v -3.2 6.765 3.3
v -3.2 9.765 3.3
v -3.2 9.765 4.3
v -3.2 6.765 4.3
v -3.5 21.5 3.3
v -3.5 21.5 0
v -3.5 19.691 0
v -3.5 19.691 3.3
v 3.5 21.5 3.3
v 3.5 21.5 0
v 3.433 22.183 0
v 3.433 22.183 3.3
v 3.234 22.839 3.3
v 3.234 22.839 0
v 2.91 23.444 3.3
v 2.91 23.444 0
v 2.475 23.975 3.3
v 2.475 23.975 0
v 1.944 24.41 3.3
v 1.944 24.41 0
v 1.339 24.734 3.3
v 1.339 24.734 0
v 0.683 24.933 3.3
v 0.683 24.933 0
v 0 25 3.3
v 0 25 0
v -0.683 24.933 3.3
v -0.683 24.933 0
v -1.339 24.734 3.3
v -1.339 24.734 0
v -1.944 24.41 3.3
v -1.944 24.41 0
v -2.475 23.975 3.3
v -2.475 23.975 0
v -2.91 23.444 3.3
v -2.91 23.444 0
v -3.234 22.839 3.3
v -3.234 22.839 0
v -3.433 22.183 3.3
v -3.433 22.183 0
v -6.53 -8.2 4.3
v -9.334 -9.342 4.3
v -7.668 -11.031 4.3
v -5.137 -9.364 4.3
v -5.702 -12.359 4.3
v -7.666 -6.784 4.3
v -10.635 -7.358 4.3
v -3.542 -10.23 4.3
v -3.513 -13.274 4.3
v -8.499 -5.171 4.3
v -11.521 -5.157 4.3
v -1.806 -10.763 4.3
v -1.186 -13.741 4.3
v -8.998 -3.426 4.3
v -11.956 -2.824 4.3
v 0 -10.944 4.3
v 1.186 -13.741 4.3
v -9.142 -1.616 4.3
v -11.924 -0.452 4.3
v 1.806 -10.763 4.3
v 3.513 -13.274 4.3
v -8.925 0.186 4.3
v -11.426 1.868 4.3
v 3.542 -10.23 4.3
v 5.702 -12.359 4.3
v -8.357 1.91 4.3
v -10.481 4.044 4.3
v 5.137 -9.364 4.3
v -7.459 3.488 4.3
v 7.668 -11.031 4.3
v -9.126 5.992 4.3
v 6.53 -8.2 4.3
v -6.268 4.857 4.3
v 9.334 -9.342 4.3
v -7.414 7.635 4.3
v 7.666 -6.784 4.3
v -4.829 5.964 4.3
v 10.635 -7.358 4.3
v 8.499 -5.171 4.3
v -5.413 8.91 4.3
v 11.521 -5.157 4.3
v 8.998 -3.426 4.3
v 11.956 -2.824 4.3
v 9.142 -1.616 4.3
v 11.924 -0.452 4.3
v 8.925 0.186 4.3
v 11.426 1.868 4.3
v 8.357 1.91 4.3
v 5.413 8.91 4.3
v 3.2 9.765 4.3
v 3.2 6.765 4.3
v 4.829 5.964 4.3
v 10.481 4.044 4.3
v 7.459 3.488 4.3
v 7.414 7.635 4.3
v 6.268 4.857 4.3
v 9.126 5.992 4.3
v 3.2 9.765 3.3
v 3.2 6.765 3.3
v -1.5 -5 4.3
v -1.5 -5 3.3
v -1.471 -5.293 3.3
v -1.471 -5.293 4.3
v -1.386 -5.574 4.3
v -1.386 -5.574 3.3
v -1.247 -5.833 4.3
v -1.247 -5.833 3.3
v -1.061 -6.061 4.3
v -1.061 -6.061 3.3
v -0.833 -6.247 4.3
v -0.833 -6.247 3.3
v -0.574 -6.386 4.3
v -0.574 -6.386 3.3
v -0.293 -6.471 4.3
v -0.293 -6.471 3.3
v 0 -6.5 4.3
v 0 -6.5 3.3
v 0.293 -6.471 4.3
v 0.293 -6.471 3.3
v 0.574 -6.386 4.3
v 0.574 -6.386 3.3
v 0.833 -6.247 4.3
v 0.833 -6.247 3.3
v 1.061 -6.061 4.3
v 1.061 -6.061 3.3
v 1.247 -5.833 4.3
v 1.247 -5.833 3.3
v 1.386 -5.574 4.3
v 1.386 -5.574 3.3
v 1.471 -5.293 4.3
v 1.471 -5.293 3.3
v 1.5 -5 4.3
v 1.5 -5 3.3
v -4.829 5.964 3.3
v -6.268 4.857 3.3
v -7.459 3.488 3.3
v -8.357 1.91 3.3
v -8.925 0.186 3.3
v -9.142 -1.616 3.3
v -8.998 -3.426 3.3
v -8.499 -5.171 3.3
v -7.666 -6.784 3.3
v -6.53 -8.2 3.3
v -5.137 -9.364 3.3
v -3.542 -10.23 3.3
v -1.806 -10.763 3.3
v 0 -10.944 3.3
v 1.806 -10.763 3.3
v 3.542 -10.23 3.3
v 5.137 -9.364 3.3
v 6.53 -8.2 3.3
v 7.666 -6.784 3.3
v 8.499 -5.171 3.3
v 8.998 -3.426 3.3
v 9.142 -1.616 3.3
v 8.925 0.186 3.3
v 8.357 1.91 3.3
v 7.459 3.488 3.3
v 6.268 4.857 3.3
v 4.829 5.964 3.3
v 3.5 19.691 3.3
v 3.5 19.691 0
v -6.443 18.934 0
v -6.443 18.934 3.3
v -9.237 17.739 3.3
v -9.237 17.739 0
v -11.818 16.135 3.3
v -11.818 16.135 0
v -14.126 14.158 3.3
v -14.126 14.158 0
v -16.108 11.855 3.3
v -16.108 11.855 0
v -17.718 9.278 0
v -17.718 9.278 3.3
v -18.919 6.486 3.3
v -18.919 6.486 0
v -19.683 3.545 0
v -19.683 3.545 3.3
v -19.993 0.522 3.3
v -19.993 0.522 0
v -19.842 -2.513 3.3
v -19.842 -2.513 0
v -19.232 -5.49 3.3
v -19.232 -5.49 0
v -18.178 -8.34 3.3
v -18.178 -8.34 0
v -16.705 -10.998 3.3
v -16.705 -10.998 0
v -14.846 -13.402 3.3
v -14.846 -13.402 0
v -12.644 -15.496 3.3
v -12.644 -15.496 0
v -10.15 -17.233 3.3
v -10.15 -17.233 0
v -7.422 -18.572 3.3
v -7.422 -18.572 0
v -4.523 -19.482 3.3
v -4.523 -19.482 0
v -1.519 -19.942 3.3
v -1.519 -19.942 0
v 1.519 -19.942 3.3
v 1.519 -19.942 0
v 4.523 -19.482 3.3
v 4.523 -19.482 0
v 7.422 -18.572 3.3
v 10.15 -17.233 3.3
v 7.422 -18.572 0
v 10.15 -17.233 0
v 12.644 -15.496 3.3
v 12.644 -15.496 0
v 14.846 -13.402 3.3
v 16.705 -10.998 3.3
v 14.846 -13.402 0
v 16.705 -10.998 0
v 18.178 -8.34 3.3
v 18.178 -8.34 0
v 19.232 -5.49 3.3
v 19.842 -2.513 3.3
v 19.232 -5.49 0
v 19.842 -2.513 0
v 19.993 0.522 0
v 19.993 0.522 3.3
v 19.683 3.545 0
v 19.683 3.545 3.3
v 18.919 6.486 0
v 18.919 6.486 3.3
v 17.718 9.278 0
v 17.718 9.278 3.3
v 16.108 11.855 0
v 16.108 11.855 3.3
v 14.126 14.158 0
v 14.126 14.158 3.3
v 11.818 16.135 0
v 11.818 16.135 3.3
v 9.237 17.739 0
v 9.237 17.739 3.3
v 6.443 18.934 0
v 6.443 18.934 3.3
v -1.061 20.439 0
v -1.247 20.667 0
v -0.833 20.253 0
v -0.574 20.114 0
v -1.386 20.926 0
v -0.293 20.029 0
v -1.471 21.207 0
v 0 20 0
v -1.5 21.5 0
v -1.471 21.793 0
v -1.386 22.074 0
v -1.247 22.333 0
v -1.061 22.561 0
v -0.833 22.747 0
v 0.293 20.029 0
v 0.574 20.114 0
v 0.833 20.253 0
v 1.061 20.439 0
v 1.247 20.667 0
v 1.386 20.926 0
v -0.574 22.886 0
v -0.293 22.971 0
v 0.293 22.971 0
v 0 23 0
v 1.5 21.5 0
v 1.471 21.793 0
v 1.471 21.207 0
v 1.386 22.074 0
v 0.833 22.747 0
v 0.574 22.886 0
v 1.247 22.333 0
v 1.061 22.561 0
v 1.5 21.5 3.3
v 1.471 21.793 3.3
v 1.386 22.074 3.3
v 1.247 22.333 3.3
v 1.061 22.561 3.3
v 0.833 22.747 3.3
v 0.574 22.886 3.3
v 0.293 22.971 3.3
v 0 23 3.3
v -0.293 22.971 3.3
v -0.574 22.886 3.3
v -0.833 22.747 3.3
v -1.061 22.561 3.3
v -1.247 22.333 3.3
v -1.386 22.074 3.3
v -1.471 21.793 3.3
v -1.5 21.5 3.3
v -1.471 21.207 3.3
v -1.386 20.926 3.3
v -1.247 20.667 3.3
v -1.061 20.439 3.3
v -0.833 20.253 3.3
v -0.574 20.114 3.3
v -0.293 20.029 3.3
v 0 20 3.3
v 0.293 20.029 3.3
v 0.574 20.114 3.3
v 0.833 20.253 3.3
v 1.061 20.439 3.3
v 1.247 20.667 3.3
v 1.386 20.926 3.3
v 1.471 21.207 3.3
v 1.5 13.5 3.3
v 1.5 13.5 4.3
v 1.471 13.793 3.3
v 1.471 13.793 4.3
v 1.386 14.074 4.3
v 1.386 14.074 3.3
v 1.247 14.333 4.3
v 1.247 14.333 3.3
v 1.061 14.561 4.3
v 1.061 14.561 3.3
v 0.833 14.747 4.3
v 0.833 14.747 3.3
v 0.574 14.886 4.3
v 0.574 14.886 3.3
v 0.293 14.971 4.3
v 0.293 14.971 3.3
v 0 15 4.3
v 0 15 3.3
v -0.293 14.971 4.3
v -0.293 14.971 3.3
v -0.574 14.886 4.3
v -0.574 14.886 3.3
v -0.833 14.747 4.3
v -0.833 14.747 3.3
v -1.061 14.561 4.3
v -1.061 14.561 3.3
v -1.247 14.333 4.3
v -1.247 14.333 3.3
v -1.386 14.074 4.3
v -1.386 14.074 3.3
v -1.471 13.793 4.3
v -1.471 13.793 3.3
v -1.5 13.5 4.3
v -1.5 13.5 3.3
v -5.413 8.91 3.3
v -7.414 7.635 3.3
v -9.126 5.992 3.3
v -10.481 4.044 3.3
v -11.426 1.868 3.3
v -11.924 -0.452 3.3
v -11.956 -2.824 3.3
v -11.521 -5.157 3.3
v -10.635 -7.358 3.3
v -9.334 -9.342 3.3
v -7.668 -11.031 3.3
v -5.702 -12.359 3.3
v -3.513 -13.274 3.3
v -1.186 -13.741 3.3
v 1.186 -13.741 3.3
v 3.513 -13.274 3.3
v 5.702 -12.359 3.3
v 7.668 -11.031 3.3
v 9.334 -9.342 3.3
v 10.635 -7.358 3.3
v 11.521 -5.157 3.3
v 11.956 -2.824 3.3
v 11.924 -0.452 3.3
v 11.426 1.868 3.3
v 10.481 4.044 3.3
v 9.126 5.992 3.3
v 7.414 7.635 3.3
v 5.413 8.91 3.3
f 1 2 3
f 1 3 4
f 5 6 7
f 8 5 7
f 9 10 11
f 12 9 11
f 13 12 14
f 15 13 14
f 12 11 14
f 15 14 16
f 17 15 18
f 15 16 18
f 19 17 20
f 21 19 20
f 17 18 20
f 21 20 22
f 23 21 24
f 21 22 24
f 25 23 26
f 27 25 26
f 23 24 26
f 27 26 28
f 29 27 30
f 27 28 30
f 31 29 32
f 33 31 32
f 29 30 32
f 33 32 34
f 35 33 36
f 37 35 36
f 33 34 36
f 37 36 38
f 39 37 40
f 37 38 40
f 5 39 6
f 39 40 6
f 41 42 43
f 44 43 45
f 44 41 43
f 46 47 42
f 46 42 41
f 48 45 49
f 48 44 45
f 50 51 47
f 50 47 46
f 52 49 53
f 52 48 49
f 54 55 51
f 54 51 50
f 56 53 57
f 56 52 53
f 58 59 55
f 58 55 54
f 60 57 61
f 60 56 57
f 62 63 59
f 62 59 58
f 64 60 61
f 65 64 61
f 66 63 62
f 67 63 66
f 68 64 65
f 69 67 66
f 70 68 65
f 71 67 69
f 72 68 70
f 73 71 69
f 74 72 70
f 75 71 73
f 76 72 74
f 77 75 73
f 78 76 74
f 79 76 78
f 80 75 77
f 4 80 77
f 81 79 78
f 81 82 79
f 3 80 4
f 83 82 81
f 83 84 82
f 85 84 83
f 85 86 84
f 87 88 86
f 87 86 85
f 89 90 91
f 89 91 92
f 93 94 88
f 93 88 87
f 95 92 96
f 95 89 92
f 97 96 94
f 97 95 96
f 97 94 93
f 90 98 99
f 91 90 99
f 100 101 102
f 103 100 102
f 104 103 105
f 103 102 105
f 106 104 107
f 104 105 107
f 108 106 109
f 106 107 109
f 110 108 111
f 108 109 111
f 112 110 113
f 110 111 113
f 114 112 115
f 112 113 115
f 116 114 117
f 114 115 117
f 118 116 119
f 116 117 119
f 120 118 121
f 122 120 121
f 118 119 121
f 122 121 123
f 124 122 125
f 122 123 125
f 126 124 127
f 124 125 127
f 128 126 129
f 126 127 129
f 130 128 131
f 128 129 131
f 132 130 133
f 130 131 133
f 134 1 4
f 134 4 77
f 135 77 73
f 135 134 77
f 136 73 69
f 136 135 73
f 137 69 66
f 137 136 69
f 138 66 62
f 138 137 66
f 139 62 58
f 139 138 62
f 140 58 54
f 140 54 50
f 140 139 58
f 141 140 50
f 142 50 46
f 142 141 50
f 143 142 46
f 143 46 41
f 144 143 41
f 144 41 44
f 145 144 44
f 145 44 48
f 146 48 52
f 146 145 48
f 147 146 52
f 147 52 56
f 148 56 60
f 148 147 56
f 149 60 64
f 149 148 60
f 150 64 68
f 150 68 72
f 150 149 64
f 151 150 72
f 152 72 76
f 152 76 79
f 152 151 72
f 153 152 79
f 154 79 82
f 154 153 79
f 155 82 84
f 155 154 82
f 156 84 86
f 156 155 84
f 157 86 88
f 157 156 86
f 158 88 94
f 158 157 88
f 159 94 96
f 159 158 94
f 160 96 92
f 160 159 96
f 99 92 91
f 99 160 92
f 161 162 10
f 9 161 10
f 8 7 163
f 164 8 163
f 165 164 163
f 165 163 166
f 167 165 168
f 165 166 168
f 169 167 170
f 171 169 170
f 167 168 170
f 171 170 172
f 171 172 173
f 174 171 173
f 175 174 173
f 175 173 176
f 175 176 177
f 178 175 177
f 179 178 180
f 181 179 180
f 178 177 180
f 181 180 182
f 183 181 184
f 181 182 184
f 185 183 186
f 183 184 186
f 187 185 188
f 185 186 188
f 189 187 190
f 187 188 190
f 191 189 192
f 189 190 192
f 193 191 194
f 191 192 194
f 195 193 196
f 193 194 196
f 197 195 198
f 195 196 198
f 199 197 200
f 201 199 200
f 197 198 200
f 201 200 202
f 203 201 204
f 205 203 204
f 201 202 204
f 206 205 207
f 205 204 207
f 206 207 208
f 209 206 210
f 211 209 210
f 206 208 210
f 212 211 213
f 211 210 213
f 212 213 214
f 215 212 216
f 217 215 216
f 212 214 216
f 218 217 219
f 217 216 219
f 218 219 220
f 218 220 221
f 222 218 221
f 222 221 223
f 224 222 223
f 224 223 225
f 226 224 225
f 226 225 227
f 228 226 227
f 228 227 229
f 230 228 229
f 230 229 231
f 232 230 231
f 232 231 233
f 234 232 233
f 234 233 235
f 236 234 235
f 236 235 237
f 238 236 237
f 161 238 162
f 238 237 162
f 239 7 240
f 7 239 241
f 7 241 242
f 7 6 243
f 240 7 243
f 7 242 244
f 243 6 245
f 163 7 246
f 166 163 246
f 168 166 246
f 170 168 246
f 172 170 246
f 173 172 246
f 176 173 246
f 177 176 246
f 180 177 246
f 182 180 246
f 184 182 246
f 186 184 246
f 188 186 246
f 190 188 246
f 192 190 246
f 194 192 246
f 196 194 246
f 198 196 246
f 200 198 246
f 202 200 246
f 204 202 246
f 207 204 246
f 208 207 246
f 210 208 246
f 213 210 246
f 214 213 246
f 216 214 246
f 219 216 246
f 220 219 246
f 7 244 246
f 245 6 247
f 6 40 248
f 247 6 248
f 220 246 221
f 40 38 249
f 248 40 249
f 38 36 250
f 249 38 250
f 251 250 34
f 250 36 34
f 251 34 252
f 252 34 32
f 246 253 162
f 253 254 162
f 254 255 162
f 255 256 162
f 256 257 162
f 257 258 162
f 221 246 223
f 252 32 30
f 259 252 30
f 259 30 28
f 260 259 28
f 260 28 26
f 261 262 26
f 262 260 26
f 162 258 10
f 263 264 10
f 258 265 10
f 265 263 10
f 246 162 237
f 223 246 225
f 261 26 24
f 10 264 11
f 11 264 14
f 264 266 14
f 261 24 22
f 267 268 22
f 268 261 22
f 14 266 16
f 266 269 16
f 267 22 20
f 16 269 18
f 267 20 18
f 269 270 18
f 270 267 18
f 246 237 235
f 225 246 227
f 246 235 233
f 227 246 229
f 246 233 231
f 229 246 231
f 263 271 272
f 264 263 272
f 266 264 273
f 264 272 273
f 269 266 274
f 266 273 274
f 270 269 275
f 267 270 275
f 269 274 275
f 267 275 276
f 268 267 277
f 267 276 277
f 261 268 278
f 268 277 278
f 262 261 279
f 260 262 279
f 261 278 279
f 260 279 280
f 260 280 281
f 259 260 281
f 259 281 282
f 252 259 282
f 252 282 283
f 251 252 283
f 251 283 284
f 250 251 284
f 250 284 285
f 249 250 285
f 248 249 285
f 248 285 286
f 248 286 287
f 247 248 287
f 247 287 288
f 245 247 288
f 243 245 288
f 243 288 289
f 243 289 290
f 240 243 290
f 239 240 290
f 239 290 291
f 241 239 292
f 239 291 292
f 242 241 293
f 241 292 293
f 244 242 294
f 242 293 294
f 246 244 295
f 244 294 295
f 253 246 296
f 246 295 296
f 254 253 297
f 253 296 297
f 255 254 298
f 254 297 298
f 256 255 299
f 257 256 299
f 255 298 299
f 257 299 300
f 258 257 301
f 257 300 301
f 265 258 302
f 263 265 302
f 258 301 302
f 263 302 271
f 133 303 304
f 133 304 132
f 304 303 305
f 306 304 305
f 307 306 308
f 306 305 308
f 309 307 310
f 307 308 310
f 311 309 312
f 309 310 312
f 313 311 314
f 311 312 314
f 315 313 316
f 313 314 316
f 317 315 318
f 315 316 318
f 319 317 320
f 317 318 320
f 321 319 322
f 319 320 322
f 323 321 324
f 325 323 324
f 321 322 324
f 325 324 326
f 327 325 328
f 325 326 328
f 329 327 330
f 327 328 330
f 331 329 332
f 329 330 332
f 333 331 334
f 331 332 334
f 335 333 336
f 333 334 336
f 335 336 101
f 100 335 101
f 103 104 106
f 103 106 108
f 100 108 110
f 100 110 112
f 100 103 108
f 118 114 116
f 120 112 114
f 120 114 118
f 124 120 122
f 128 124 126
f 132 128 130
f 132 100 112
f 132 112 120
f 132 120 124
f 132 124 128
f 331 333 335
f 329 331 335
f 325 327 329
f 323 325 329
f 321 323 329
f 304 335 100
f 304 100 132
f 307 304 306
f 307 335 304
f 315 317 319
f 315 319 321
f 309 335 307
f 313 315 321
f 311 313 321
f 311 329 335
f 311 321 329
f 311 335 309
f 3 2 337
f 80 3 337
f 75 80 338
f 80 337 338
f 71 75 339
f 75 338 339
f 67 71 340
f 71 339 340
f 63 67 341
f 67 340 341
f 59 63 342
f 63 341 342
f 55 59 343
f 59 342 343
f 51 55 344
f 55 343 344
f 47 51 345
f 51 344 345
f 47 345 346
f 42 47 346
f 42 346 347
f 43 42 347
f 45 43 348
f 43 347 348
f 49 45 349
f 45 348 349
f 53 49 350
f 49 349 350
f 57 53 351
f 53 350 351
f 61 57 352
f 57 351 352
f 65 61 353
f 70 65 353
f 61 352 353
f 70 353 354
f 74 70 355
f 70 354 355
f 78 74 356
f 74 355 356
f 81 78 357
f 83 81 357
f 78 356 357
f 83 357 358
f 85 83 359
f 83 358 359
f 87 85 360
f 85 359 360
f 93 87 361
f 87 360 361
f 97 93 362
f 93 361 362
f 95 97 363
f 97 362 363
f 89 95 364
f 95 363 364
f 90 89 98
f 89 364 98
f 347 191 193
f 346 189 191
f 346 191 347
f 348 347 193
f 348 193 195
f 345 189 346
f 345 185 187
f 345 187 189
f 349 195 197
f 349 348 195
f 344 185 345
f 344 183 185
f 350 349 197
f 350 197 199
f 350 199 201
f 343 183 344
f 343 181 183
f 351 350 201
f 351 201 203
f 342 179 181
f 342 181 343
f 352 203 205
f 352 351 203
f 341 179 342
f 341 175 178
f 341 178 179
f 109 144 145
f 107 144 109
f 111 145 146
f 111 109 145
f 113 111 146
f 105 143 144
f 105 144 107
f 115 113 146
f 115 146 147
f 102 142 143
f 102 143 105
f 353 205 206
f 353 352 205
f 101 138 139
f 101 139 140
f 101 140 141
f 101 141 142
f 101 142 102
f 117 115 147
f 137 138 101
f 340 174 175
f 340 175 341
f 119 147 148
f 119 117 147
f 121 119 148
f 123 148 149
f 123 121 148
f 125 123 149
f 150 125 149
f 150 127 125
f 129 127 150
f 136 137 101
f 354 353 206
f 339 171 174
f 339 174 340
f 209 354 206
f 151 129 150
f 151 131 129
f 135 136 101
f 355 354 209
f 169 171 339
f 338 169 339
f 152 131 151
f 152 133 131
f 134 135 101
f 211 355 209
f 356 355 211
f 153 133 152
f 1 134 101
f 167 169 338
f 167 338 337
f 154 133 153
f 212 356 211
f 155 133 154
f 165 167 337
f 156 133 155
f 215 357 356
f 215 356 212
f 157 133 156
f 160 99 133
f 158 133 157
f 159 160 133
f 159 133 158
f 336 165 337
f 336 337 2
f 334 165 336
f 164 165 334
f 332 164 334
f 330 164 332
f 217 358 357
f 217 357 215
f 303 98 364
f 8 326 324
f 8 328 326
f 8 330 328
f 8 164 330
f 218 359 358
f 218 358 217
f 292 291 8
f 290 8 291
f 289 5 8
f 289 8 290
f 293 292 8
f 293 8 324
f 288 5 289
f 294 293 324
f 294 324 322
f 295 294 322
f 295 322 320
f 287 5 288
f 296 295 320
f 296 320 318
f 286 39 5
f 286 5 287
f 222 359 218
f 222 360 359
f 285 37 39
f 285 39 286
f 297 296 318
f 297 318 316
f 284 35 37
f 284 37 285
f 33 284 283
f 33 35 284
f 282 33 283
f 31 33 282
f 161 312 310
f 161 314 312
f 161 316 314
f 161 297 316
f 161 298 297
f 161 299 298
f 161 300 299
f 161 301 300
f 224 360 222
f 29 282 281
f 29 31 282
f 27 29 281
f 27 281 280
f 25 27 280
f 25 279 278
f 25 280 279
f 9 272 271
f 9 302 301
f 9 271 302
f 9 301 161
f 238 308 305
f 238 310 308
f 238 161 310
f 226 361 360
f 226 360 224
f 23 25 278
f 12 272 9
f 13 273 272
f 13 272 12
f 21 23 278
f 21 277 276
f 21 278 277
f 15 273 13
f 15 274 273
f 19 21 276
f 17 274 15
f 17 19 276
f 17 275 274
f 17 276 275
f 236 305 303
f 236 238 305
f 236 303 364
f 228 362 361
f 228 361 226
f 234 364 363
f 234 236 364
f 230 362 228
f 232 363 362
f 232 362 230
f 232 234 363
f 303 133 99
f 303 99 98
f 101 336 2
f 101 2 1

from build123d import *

# Parameters (mm, degrees)
EXTRUDE_DEPTH = 3.3
SKETCH001_R   = 1.5
POCKET_DEPTH  = 3.301
PAD_DEPTH     = 1


with BuildPart() as part:
    # Sketch → Extrude (new body)
    with BuildSketch(Plane.XY):
        with BuildLine():
            ThreePointArc((3.5, 21.5), (0, 25), (-3.5, 21.5))
            Line((-3.5, 21.5), (-3.5, 19.691369))
            ThreePointArc((-3.5, 19.691369), (0, -20), (3.5, 19.691369))
            Line((3.5, 19.691369), (3.5, 21.5))
        make_face()
    extrude(amount=EXTRUDE_DEPTH)

    # Sketch001 → Pocket (cut, through all)
    with BuildSketch(Plane.XY.offset(3.3)):
        with Locations((0, 21.5)):
            Circle(SKETCH001_R)
    extrude(amount=-POCKET_DEPTH, mode=Mode.SUBTRACT)

    # Sketch002 → Pad (new body)
    with BuildSketch(Plane.XY.offset(3.3)):
        with BuildLine():
            ThreePointArc((-3.2, 9.765466), (0, -13.8), (3.2, 9.765466))
            Line((3.2, 9.765466), (3.2, 6.765466))
            ThreePointArc((-3.2, 6.765466), (0, -10.943698), (3.2, 6.765466))
            Line((-3.2, 9.765466), (-3.2, 6.765466))
        make_face()
        with BuildLine():
            ThreePointArc((1.5, 13.5), (0, 15), (-1.5, 13.5))
            Line((-1.5, 13.5), (-1.5, -5))
            ThreePointArc((-1.5, -5), (0, -6.5), (1.5, -5))
            Line((1.5, 13.5), (1.5, -5))
        make_face()
    extrude(amount=PAD_DEPTH)


solid = part.part
